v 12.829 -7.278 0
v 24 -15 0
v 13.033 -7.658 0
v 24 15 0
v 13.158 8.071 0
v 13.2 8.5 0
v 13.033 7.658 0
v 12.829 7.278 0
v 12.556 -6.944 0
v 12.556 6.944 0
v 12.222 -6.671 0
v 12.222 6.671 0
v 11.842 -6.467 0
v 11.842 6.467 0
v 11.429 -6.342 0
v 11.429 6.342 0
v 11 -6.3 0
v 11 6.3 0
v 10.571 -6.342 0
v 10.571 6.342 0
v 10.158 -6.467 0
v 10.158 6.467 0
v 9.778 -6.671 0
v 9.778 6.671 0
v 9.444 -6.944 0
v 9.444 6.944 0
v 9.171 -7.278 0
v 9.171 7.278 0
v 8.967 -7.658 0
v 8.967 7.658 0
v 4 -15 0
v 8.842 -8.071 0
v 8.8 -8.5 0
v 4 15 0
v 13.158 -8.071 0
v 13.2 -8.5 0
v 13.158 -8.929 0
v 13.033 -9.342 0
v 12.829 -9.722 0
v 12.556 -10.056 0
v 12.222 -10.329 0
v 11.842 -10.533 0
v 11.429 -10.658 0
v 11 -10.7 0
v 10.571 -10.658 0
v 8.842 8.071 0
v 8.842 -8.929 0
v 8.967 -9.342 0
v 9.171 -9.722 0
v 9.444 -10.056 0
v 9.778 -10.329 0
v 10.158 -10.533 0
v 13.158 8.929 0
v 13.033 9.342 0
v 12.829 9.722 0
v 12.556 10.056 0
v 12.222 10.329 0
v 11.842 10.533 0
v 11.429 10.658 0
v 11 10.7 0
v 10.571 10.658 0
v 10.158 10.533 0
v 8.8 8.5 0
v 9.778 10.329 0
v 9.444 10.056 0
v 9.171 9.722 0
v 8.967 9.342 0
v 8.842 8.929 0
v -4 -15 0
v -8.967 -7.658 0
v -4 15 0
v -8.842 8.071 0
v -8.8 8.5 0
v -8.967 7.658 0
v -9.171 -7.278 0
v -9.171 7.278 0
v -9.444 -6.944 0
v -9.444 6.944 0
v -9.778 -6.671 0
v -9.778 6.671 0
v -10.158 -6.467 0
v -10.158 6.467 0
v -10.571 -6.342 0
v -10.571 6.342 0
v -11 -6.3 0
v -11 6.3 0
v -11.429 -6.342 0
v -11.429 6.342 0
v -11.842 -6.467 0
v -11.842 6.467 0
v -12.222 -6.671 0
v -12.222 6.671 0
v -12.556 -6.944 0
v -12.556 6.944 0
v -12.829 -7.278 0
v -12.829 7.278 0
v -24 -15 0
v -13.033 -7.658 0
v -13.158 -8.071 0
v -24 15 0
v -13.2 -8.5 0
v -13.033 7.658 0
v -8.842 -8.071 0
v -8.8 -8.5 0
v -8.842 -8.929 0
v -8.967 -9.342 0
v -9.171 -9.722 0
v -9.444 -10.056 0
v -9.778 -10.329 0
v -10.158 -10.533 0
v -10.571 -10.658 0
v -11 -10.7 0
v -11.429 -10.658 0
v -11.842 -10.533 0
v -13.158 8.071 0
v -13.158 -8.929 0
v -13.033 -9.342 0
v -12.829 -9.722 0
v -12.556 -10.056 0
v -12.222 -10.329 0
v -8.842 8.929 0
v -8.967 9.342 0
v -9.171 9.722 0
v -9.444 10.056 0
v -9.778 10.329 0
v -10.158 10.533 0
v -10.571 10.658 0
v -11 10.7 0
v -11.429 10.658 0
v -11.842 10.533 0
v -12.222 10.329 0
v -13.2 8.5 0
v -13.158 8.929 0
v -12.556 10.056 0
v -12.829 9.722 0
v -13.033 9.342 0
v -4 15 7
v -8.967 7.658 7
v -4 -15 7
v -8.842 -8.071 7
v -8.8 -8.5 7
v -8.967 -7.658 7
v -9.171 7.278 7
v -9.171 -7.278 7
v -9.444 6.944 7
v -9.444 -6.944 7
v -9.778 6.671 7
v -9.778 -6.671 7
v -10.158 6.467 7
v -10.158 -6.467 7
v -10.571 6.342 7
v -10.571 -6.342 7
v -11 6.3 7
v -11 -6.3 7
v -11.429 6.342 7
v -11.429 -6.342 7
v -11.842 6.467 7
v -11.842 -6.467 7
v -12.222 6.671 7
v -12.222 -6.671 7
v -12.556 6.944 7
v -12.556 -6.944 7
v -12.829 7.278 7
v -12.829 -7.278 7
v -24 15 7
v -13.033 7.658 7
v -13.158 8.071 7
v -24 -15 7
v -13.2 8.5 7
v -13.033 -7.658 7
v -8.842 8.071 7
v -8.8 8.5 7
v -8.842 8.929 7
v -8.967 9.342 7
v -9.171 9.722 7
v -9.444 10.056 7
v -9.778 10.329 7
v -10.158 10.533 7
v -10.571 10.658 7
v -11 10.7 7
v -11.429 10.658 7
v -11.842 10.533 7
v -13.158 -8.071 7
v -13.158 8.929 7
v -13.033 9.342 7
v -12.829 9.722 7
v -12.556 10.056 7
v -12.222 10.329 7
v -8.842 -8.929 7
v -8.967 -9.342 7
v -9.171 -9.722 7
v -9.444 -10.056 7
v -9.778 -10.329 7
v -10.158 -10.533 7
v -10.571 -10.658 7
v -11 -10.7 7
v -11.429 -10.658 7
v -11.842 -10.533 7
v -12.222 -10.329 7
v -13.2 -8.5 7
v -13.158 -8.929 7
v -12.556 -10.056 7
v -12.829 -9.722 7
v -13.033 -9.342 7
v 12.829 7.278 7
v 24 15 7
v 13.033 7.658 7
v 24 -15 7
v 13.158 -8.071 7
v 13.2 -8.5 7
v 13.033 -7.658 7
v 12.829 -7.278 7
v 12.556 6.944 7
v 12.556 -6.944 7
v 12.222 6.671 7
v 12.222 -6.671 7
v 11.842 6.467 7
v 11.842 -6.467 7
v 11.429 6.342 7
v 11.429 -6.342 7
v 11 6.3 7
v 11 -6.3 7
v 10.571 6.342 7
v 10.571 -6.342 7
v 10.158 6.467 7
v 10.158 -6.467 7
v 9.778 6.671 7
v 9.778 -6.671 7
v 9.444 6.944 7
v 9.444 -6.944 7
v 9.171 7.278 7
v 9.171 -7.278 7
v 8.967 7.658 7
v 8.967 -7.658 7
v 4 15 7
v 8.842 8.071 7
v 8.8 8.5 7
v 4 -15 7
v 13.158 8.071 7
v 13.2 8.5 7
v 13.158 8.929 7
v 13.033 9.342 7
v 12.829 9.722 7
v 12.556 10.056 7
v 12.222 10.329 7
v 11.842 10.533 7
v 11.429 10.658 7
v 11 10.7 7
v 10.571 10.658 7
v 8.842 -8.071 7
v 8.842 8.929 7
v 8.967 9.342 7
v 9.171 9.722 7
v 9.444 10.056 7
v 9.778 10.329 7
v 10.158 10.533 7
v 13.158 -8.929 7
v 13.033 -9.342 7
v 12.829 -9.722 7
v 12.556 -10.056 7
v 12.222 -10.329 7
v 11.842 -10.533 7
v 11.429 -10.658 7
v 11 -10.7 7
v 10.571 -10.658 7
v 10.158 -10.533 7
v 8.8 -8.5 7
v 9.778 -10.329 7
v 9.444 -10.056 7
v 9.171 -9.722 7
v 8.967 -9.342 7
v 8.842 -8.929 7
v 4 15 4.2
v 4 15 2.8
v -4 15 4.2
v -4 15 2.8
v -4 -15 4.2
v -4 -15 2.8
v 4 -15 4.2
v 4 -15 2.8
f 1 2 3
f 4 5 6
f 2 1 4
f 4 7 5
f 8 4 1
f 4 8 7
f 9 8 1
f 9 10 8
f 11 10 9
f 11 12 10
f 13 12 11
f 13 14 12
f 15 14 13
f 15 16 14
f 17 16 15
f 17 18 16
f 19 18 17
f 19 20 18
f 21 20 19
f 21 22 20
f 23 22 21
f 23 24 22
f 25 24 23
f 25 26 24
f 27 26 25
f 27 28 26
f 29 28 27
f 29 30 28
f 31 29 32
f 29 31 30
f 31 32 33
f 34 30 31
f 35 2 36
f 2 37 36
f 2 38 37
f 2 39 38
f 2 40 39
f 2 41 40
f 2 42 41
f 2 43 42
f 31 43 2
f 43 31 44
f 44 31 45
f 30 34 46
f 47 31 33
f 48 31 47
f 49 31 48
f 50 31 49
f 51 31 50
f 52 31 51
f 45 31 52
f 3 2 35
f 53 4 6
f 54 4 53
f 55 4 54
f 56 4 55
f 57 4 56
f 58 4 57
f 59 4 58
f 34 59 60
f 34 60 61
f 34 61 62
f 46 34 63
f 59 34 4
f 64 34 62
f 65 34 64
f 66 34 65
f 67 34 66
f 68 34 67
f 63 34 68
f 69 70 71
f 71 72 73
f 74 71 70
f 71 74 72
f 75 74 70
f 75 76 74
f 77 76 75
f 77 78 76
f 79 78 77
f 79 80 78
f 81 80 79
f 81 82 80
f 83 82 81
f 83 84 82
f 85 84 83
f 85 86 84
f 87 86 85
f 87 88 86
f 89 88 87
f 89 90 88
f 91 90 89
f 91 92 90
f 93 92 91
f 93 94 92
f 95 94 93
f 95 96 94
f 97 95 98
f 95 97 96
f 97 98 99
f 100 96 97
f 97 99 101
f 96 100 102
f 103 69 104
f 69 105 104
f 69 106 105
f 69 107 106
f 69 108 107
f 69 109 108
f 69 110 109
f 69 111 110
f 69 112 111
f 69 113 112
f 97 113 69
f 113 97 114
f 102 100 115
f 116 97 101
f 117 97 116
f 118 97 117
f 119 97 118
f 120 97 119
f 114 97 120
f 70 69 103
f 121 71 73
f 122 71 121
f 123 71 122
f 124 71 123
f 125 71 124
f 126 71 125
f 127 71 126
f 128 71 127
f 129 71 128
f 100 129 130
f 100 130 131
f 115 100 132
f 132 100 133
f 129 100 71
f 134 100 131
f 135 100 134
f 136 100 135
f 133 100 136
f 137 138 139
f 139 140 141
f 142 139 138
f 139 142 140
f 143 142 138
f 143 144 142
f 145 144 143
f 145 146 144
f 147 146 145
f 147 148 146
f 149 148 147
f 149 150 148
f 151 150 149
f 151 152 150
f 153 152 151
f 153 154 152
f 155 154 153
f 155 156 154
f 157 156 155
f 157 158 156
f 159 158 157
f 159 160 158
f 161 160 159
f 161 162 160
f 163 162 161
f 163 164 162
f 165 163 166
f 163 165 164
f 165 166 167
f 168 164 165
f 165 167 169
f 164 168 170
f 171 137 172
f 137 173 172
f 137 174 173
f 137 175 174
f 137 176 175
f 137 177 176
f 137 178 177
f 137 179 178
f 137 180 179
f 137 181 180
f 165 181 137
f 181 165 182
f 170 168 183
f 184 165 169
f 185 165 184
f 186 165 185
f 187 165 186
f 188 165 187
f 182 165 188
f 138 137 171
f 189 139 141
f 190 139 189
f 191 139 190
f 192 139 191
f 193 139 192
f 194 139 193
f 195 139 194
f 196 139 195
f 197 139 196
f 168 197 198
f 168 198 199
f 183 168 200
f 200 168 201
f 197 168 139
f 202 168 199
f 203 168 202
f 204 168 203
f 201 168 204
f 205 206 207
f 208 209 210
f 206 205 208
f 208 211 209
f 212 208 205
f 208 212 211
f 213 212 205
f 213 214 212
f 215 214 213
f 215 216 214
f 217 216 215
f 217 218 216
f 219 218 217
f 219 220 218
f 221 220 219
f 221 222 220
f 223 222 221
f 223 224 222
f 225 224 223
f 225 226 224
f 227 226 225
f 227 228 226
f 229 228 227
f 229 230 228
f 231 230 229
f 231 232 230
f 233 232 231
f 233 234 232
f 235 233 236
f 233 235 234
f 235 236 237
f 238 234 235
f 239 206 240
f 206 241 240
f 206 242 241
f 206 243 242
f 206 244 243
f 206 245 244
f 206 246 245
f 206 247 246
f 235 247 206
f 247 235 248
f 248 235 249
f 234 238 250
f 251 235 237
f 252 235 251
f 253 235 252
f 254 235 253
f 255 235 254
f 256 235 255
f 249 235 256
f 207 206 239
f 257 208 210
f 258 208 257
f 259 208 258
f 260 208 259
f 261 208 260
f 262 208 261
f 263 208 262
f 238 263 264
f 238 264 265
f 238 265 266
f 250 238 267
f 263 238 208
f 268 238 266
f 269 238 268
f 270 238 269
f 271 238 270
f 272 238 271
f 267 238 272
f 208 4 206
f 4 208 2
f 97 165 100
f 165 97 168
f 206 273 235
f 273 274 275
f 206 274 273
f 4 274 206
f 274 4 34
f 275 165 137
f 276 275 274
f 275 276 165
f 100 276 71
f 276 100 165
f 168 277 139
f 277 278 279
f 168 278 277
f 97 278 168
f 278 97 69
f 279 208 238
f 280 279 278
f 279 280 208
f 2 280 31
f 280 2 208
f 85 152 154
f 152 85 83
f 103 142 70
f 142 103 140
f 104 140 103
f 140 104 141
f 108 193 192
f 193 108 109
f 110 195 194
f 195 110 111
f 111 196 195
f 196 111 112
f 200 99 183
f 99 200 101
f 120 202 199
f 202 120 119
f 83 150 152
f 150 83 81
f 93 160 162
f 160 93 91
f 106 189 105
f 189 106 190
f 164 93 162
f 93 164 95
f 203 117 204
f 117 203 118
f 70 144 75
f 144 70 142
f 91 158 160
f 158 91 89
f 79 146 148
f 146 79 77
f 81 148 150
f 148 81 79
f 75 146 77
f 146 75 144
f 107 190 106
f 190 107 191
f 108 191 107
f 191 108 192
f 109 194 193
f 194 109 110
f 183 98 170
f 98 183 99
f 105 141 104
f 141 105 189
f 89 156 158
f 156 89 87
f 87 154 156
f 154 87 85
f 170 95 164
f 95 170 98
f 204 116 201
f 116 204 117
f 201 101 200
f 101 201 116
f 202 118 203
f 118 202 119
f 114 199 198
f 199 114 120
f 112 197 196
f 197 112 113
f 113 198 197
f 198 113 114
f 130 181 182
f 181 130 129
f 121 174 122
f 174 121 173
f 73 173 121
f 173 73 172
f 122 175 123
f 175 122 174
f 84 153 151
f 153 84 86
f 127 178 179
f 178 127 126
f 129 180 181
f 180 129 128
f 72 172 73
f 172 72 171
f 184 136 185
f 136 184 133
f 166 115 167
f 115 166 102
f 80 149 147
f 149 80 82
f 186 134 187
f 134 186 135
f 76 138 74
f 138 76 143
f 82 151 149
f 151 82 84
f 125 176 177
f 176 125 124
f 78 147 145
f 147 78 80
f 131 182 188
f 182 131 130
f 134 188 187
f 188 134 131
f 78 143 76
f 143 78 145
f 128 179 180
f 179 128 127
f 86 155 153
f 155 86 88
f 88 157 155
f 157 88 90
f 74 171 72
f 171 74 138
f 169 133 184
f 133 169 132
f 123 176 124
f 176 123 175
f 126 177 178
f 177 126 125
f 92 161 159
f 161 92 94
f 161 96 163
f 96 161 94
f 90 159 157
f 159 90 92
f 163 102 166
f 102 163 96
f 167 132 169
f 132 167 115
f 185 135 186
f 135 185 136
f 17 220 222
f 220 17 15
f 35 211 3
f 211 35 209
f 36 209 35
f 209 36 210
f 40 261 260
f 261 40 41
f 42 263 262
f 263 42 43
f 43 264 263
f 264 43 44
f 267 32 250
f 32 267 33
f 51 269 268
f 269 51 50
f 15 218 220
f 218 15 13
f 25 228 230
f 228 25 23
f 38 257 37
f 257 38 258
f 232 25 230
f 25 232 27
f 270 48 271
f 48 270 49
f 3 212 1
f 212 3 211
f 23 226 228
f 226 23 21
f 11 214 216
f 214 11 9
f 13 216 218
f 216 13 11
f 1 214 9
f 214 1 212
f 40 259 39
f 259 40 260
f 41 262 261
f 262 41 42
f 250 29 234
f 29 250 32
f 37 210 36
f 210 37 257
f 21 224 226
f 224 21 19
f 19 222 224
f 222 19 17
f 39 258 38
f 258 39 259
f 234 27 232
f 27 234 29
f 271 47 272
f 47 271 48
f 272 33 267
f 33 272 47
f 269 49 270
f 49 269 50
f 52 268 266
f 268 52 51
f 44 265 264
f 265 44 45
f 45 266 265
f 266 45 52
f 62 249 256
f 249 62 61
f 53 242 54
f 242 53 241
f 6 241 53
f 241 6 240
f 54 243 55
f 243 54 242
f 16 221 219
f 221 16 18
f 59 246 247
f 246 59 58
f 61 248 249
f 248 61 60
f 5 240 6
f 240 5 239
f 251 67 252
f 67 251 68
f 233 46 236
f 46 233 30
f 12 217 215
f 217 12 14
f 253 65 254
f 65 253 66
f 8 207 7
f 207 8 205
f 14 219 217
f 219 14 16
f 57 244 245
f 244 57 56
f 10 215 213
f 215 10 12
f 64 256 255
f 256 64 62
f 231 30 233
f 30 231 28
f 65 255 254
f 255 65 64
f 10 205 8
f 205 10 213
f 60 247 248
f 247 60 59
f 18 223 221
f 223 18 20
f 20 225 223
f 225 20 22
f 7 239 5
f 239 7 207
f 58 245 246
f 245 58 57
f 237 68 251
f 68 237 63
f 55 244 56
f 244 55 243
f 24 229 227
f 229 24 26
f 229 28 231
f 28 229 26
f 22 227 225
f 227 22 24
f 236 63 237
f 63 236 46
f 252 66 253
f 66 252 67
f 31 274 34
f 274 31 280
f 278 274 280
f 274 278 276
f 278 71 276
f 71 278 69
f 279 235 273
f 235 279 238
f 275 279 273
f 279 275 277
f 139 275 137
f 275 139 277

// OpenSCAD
$fn = 32;

// ----------------------------------------------------------------------
// Living hinge: 48 x 30 mm plates, 1.4 mm flexible web
// ----------------------------------------------------------------------

// --- parameters (mm) ---
plate_len = 20;           // plate length outside the web
plate_w = 30;             // plate width
thick = 7;                // plate thickness
web_half = 4;             // half width of the flex band
web_t = 1.4;              // flexible web thickness
web_z = 2.8;              // web position inside the thickness
boss_d = 9;               // screw boss diameter
boss_h = 7;               // screw boss height
boss_x = 11;              // screw boss distance from the web
screw_d = 4.4;            // screw hole

difference() {
  union() {
    /* one flat strip, later thinned at the middle */
    translate([-24, -15, 0]) cube([48, 30, 7]);
    /* screw bosses, sunk 0.5 mm into the plates */
    for (sx = [-11, 11]) {
      for (sy = [-8.5, 8.5]) {
        translate([sx, sy, 0]) cylinder(h = boss_h, d = boss_d);
      }
    }
  }
  /* channel from below: leaves the web on top of it */
  translate([-4, -17.5, -2.5]) cube([8, 35, 5.3]);
  /* channel from above: thins the web down to web_t */
  translate([-4, -17.5, 4.2]) cube([8, 35, 5.3]);
  /* screw holes through the bosses */
  for (sx = [-11, 11]) {
    for (sy = [-8.5, 8.5]) {
      translate([sx, sy, -2.5]) cylinder(h = boss_h + 5, d = screw_d);
    }
  }
}
